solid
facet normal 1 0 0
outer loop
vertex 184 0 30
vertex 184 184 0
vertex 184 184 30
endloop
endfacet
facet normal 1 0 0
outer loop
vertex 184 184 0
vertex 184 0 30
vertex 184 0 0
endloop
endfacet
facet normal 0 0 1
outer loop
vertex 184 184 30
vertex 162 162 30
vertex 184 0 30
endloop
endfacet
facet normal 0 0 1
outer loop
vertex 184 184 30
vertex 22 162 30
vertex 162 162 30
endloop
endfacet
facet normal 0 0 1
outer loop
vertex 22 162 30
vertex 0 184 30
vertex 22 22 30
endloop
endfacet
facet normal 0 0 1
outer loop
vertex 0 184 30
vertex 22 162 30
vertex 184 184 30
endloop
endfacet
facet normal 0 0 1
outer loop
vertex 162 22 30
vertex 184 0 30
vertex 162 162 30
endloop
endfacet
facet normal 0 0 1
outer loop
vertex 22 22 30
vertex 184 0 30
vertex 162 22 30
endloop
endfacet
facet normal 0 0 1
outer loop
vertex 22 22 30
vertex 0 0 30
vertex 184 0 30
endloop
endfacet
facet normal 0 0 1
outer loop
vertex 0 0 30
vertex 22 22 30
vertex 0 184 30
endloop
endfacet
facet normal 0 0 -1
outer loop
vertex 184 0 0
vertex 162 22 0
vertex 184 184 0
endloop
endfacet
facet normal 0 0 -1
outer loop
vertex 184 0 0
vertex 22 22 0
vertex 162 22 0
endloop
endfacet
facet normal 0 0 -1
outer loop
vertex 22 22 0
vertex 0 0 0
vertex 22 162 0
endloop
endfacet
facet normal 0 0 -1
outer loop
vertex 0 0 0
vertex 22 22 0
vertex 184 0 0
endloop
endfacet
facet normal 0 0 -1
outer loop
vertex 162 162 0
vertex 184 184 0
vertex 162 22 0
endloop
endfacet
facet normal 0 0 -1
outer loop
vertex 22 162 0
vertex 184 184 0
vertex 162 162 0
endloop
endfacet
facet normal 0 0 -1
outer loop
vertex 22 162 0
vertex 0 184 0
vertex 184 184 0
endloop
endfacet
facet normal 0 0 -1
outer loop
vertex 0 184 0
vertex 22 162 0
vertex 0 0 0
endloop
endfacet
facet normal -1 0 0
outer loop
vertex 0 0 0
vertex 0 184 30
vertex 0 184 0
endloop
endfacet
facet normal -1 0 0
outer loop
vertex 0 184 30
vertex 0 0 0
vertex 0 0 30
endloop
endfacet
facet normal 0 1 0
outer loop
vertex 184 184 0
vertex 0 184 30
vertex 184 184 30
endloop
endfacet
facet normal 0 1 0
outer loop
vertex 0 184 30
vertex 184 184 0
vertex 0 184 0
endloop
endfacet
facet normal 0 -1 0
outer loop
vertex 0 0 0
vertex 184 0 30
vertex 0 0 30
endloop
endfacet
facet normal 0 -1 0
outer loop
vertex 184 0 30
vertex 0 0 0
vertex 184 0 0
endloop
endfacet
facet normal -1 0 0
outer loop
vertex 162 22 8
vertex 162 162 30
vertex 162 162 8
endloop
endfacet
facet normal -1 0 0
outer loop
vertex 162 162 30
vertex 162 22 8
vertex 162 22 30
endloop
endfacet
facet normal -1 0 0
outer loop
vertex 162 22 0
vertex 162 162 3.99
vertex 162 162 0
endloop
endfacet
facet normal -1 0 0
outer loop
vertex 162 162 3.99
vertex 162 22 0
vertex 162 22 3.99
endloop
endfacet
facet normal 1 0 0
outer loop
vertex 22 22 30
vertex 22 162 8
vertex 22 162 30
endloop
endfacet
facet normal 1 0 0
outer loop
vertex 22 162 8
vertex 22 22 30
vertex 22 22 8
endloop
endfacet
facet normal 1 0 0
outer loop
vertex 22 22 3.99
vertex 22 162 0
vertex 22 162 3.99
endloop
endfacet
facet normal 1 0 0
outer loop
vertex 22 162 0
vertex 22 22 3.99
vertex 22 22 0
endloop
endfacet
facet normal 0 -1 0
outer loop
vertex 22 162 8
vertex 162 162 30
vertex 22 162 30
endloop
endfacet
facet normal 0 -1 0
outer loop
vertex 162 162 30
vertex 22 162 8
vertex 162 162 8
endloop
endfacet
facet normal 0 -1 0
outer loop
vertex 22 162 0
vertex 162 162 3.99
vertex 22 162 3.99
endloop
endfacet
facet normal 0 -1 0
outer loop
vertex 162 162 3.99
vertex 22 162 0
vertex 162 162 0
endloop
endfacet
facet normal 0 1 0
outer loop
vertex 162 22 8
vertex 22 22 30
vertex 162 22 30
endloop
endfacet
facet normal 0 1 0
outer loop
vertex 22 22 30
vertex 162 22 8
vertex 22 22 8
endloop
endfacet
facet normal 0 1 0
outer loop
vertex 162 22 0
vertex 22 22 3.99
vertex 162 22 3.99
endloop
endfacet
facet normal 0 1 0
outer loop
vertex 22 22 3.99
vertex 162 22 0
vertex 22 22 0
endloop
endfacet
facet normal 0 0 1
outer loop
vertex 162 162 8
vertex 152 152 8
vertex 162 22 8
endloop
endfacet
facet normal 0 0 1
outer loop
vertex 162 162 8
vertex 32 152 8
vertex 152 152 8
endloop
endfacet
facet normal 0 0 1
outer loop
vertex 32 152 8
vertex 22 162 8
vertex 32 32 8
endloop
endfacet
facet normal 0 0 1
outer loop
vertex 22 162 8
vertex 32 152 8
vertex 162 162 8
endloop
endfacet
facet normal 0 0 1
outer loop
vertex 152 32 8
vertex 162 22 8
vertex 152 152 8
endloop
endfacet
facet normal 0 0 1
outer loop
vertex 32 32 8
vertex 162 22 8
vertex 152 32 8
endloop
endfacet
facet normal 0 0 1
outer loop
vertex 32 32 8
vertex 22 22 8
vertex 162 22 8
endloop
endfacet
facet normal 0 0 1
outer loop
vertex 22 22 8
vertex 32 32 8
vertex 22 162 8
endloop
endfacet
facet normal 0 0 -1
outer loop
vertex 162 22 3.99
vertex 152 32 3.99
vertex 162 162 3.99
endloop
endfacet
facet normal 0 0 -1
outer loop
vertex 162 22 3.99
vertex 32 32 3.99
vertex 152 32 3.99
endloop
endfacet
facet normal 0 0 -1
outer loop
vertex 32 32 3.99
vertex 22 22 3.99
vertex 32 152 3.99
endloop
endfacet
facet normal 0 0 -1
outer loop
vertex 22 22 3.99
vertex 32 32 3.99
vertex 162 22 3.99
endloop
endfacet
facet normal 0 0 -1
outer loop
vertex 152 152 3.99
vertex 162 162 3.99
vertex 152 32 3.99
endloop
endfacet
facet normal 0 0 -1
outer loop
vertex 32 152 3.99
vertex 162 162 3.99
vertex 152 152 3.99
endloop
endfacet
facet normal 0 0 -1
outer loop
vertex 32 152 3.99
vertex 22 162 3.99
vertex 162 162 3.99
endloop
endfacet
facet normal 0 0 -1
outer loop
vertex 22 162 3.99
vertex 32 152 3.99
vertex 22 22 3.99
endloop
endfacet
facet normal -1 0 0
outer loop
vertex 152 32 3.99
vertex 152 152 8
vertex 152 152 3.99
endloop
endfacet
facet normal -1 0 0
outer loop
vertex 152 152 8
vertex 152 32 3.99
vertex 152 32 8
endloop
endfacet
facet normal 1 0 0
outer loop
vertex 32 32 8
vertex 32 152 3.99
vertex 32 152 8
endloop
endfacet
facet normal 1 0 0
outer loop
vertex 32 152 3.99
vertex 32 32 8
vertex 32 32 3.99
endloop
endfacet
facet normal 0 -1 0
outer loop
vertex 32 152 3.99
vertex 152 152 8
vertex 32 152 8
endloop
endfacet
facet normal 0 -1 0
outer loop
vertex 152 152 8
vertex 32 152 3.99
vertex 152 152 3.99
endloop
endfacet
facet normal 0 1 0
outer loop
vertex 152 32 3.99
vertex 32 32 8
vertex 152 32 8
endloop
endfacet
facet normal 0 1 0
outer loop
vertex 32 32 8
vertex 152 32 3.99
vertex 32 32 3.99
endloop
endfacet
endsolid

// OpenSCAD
$fa = 1;
$fs = 0.04;
e = 0.01;

module frame() {
    union () {
        difference() {
            cube([184, 184, 30]);
            translate([22, 22, -e])
                cube([140, 140, 30 + 2*e]);
        }
        difference() {
            translate([22, 22, 4-e])
                cube([140, 140, 4 + e]);

            translate([32, 32, -e])
                cube([120, 120, 30 + 2*e]);
        }
    }
}

frame();
